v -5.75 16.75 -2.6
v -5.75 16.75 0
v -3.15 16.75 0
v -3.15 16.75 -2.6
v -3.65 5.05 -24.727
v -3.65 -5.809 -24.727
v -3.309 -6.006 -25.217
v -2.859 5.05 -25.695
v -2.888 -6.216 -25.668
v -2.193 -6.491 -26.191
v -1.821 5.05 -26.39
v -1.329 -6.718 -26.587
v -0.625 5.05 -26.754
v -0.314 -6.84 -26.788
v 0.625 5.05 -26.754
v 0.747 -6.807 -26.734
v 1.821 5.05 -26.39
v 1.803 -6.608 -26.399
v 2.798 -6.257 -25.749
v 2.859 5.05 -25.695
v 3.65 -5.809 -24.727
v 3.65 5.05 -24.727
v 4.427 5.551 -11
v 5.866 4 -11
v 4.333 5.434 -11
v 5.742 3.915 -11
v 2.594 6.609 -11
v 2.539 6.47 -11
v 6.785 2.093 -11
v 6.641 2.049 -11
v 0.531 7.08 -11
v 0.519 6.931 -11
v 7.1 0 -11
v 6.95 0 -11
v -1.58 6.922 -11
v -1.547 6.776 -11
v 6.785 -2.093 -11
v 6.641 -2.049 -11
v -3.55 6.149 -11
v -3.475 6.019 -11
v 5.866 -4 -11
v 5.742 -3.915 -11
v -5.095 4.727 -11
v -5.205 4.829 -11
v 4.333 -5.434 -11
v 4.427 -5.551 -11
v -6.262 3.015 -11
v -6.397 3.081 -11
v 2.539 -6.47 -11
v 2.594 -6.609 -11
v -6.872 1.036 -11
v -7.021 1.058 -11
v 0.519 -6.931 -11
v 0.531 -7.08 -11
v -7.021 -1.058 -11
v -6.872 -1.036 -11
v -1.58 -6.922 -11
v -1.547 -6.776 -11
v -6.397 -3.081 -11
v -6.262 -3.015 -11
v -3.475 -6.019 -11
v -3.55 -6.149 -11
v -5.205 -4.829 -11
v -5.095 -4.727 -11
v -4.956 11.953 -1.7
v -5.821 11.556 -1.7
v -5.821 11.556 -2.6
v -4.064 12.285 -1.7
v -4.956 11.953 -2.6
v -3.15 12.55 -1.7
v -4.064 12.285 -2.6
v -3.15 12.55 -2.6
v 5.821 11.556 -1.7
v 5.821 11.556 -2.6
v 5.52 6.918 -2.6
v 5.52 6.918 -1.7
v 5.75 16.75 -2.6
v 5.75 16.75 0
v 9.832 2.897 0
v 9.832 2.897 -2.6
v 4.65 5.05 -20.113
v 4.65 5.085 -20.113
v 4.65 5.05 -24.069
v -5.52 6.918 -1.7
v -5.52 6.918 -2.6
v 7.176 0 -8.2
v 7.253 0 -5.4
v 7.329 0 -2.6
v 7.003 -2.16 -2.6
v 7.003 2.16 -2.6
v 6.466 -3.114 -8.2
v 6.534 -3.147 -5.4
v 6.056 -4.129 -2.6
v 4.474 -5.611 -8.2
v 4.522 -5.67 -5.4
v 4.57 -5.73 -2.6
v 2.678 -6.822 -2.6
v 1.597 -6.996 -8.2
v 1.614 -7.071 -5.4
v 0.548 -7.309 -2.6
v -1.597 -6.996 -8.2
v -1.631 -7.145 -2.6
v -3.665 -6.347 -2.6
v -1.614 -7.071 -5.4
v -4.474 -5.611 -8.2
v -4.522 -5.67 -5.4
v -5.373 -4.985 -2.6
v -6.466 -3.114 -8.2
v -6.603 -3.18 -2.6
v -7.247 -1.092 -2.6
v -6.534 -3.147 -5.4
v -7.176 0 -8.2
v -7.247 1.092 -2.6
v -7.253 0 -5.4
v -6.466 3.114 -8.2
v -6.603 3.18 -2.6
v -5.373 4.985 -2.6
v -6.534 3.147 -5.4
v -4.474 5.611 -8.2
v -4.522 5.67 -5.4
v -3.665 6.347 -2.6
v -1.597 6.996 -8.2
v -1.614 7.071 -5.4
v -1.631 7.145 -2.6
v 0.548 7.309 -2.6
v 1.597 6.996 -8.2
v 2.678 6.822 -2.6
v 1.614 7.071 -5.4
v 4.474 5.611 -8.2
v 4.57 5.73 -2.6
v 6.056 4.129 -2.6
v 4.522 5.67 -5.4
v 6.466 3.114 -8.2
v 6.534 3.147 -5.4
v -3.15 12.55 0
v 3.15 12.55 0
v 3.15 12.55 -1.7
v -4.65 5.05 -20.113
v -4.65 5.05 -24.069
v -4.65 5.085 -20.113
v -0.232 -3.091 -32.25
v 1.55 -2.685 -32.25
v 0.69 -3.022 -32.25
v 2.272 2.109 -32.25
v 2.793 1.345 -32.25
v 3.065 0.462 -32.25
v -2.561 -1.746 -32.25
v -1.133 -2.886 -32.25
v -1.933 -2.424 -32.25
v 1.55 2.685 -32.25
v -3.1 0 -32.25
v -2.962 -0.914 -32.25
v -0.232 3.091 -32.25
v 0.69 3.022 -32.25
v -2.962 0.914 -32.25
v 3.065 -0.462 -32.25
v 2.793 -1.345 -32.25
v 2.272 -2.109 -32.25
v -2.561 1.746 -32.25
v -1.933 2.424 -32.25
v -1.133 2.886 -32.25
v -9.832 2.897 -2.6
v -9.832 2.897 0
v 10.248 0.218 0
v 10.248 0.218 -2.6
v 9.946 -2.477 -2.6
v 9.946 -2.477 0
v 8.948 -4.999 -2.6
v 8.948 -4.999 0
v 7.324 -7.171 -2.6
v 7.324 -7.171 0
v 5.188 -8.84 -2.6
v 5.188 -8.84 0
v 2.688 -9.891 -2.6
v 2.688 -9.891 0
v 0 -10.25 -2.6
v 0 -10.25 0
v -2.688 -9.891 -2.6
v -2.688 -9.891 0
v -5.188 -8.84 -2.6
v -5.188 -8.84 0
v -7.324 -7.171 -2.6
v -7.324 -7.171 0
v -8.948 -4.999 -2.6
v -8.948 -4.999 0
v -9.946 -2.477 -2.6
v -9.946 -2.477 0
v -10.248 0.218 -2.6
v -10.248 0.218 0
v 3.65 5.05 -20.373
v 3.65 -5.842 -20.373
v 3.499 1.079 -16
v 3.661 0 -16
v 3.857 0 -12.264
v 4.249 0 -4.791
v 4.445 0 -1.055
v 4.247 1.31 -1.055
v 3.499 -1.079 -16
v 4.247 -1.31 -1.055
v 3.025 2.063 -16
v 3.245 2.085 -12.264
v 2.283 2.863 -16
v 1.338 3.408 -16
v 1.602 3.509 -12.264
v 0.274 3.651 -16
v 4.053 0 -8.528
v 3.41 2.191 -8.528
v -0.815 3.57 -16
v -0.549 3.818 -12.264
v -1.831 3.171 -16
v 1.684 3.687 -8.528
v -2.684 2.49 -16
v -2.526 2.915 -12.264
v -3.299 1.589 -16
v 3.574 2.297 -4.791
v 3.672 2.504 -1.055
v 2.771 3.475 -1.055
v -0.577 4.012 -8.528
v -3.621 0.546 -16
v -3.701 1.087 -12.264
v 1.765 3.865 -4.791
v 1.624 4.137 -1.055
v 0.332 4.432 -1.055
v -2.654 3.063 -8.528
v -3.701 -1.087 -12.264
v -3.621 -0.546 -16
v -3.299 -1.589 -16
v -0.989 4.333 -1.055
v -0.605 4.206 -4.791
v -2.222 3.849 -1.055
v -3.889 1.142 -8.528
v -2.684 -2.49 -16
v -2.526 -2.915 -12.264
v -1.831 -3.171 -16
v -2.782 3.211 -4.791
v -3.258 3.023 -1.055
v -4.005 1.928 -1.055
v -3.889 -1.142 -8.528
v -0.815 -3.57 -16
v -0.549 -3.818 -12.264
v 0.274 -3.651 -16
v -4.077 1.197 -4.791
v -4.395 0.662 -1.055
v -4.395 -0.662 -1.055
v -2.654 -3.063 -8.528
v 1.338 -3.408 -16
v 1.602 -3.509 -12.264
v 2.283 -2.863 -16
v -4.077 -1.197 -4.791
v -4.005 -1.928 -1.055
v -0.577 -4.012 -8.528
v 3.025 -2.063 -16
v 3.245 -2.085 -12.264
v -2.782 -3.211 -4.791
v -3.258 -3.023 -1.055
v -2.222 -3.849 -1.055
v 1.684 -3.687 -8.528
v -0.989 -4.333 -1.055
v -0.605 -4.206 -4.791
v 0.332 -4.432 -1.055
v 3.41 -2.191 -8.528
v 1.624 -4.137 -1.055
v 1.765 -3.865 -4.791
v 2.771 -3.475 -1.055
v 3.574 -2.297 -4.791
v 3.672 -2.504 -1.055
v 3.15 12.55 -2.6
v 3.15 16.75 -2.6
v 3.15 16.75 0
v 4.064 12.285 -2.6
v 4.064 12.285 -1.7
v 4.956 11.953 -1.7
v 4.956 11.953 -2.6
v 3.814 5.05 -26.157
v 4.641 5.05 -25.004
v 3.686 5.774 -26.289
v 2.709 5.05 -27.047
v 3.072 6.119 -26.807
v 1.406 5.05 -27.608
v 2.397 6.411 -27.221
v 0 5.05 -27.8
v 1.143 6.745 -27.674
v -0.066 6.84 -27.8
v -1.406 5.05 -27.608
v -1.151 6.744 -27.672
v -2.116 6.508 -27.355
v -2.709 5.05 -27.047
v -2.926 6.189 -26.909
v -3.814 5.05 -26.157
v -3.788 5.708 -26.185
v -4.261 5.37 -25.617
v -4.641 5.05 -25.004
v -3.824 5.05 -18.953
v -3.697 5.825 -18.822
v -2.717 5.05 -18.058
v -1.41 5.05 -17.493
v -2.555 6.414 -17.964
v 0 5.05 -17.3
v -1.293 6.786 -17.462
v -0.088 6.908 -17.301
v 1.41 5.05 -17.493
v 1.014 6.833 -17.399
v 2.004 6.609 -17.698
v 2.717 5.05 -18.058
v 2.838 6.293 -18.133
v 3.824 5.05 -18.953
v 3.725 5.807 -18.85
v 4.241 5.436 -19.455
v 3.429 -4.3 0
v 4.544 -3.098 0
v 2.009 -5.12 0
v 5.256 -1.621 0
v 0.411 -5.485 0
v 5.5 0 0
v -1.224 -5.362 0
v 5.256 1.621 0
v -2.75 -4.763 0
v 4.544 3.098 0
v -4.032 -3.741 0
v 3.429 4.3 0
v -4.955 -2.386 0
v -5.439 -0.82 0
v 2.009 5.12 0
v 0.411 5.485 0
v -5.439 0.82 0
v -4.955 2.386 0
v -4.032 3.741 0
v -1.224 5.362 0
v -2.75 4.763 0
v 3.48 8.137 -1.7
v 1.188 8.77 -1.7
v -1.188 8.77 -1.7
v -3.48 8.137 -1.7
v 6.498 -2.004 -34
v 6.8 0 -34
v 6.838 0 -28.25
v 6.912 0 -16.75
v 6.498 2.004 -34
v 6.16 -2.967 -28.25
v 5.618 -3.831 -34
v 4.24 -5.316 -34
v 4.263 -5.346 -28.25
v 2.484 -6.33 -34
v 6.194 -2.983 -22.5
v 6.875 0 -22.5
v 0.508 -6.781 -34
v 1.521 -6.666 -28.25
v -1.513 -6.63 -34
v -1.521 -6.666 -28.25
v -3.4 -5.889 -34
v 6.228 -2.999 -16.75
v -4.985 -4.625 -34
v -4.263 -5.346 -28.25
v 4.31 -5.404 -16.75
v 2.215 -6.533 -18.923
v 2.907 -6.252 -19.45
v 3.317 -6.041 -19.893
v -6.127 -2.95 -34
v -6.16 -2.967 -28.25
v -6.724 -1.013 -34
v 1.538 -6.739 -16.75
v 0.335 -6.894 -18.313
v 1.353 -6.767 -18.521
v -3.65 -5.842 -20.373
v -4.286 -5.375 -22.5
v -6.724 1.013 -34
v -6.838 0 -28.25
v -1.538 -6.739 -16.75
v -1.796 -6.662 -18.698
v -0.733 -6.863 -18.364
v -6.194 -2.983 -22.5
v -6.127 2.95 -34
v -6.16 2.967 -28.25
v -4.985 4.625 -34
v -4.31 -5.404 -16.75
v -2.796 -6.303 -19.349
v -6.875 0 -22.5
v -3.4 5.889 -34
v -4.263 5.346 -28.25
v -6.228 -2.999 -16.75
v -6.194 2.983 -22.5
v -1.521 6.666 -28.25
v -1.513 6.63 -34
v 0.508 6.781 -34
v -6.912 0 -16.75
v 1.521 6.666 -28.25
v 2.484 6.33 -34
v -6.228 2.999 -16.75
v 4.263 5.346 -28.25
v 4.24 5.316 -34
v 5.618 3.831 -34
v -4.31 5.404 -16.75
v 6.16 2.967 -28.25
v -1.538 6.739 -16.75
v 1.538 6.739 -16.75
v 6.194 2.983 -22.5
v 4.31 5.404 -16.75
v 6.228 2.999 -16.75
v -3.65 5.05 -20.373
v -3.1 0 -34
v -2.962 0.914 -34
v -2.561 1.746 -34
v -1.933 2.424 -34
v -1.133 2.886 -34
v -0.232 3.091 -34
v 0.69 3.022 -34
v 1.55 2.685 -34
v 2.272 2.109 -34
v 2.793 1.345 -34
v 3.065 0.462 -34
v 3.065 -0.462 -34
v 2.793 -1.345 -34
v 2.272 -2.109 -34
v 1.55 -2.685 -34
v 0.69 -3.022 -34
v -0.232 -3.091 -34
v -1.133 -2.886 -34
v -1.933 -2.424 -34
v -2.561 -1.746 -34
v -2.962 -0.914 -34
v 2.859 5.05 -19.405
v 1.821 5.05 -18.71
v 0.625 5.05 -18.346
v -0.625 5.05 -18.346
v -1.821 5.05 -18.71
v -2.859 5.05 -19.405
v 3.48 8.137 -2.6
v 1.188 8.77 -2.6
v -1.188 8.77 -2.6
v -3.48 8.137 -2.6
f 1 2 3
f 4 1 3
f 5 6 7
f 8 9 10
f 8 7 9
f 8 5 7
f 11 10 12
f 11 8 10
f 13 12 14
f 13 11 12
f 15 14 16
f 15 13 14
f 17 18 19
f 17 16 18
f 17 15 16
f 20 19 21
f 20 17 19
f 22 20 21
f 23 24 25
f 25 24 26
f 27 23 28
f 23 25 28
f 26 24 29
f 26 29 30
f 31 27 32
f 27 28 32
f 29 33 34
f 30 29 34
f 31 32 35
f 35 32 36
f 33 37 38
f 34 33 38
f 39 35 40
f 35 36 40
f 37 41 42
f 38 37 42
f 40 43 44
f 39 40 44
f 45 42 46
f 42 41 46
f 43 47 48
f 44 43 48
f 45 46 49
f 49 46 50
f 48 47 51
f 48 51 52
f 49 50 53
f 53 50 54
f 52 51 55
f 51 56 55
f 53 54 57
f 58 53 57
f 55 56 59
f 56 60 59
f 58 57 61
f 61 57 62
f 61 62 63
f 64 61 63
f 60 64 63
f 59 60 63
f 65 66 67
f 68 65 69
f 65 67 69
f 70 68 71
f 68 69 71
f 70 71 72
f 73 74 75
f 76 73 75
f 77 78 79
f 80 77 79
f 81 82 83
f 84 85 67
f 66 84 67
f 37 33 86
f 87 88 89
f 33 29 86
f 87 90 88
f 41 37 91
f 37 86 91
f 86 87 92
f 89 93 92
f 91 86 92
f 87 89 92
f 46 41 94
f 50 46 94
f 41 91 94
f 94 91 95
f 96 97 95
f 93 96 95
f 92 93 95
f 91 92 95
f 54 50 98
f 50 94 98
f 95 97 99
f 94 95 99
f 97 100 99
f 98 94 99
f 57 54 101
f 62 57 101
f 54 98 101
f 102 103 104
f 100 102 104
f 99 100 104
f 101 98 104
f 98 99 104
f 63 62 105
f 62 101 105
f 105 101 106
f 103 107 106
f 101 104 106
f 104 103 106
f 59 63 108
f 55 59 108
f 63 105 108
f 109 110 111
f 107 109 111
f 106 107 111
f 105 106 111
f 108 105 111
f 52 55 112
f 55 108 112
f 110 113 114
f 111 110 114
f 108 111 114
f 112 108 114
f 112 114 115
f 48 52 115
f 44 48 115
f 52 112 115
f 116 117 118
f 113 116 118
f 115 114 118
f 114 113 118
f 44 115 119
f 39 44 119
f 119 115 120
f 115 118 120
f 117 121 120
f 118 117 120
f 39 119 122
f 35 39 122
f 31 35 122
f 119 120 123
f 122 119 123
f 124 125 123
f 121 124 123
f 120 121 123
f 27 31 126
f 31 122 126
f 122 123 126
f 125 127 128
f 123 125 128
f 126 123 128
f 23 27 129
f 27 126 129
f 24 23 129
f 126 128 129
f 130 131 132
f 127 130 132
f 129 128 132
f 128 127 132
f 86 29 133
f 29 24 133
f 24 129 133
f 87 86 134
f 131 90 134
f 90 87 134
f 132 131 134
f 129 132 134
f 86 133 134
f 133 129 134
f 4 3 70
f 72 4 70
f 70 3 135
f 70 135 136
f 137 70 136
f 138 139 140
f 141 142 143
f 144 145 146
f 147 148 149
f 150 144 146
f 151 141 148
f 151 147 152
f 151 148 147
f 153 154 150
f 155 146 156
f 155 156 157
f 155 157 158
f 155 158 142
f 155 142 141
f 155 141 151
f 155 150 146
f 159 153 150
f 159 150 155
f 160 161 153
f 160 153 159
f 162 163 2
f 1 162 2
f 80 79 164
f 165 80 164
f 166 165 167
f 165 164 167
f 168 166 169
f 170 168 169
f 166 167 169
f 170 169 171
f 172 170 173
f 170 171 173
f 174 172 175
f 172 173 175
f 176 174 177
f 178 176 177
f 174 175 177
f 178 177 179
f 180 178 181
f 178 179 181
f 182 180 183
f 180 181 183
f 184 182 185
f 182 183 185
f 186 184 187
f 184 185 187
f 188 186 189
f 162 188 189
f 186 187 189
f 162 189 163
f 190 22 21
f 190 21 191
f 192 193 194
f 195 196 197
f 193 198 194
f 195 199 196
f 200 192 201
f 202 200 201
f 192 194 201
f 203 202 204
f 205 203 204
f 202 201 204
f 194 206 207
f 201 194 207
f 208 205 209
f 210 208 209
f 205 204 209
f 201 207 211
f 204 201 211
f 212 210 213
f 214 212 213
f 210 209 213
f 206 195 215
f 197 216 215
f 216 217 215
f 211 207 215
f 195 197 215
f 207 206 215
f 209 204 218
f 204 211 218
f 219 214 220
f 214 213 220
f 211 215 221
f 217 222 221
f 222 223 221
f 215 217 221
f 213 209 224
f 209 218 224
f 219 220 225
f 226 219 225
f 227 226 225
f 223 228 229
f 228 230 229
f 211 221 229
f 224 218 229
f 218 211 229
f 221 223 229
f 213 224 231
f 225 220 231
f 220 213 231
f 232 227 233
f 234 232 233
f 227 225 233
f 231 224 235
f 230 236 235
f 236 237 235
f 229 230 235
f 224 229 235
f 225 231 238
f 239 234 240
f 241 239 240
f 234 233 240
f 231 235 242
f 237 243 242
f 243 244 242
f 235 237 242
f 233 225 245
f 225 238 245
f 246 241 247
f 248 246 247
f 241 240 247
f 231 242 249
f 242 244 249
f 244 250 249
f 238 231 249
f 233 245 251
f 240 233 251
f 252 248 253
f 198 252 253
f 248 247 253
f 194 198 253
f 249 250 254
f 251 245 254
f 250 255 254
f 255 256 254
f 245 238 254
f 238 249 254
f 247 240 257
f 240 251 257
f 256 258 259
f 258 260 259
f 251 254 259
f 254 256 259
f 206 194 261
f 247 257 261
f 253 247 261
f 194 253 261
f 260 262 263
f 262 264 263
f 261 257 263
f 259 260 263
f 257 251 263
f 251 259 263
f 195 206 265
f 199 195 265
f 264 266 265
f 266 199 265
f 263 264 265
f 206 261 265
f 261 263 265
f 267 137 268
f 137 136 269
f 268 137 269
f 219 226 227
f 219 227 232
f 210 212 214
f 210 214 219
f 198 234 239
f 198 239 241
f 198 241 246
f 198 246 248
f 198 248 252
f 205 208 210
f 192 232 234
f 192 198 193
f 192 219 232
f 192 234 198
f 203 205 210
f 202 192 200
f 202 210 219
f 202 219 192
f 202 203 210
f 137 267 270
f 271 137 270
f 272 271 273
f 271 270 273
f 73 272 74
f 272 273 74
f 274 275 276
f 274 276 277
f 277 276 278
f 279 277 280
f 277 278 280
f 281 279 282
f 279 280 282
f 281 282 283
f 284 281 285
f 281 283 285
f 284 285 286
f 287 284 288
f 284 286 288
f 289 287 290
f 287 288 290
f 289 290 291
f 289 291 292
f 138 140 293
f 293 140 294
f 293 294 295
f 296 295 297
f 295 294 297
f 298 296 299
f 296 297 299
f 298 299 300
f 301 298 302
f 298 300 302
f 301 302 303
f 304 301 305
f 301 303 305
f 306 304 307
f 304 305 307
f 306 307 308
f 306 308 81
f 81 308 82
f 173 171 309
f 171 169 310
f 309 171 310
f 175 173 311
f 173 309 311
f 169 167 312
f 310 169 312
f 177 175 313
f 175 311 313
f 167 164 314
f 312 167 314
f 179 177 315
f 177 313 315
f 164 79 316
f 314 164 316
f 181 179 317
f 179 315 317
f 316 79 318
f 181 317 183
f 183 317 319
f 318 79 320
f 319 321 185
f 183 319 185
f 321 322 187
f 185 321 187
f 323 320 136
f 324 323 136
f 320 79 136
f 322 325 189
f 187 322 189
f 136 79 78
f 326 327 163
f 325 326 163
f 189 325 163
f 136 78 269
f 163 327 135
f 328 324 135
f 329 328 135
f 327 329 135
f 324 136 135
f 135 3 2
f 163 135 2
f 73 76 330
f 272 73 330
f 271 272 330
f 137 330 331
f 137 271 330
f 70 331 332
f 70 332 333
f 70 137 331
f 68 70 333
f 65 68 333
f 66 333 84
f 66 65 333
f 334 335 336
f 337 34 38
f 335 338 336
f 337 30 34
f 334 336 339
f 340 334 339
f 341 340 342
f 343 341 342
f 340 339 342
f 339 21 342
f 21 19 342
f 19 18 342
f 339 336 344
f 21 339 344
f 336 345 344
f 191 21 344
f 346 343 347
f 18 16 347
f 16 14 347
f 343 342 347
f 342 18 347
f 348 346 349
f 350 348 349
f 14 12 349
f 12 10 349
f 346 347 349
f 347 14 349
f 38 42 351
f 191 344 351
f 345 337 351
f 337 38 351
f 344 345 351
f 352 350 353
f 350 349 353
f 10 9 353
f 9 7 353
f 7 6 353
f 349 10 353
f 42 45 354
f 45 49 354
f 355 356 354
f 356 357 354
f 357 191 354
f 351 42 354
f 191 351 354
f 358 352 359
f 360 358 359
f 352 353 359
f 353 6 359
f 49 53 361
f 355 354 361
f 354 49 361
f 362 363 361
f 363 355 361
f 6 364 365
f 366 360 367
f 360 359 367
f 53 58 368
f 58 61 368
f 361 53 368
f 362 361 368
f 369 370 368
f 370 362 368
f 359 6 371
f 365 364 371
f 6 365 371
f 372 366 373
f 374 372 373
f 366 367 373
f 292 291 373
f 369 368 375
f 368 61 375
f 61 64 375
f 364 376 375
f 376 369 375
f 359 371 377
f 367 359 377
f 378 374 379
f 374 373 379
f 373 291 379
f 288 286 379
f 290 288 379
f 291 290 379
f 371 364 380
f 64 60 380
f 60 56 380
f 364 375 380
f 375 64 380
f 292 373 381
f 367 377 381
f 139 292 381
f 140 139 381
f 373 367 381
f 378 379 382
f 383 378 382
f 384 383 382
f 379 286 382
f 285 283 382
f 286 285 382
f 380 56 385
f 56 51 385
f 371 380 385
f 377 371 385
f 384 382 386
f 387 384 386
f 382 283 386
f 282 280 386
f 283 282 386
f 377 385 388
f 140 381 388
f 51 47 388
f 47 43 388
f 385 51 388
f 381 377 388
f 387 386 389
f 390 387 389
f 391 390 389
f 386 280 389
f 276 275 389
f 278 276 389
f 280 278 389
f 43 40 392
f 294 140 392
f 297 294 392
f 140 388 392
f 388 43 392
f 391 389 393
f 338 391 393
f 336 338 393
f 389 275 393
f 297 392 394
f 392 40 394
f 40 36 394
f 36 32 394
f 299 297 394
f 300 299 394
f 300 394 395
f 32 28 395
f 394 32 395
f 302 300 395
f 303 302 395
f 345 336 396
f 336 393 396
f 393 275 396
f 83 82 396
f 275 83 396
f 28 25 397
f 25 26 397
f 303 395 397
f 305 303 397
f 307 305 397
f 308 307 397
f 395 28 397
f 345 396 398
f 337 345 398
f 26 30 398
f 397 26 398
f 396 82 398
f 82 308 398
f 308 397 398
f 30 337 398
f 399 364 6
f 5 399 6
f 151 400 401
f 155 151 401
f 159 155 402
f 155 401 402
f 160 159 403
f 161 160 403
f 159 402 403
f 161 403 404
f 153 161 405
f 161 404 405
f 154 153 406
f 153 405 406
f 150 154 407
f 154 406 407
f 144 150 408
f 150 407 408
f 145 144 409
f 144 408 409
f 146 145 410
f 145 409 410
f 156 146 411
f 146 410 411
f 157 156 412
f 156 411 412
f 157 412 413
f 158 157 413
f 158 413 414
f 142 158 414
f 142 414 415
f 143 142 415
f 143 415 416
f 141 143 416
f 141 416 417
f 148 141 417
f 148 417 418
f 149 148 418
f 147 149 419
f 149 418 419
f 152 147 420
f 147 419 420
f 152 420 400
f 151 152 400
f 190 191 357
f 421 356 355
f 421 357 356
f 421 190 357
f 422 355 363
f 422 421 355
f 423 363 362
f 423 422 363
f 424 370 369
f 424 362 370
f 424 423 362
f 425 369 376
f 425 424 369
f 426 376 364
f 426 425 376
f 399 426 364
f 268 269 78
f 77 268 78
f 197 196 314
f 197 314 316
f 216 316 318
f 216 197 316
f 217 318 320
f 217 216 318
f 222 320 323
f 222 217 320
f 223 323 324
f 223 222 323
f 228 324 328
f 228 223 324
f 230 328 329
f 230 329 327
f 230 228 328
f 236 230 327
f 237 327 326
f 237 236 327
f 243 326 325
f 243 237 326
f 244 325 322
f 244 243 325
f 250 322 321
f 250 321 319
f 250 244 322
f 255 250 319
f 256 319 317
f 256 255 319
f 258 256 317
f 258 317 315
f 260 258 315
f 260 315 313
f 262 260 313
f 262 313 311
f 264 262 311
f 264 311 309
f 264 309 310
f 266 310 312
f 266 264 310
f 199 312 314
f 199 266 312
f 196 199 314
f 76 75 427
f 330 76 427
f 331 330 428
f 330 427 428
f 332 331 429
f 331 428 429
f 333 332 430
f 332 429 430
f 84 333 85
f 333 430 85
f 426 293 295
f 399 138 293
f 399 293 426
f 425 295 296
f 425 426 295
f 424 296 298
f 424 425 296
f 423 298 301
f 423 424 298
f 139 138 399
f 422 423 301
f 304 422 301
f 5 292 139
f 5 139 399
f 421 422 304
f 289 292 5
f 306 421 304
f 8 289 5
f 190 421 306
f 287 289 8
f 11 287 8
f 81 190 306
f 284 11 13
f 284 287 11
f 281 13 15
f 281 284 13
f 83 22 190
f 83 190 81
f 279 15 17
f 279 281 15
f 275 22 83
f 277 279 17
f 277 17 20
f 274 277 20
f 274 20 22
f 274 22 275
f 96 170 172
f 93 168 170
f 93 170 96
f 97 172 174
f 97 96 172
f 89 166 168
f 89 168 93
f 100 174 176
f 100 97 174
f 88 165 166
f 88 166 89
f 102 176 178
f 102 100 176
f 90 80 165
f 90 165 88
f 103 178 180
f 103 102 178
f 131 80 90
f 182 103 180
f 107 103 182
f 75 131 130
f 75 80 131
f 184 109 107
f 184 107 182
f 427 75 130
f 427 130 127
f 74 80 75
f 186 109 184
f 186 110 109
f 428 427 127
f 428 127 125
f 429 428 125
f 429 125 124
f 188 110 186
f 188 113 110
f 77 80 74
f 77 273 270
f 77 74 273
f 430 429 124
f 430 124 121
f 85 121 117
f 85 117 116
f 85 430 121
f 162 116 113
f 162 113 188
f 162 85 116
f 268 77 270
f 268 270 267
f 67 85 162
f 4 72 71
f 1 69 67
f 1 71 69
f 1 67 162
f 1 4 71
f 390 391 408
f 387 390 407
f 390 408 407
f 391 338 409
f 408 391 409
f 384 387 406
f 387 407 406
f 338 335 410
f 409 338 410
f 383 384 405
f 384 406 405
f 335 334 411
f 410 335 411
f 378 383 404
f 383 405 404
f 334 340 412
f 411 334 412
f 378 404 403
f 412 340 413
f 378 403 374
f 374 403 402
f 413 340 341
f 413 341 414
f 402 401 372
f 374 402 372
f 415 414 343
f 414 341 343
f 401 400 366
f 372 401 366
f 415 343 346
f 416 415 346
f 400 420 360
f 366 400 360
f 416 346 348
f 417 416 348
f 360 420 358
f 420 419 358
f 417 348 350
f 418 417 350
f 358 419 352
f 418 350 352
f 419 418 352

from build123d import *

# Parameters (mm, degrees)
BOSS_EXTRUDE1_DEPTH = 2.6
CUT_EXTRUDE1_DEPTH  = 0.9
SKETCH4_R           = 4.5
CUT_EXTRUDE2_DEPTH  = 16
CUT_EXTRUDE2_DRAFT  = -3
SKETCH5_R           = 3.1
CUT_EXTRUDE3_DEPTH  = 1.75
CUT_EXTRUDE4_DEPTH  = 43.200740515
CUT_EXTRUDE5_DEPTH  = 7.5
CHAMFER1_SIZE       = 1
CHAMFER1_SIZE2      = 1.056754503


with BuildPart() as part:
    # Sketch1 → Revolve1 (revolve)
    with BuildSketch(Plane(origin=(0, 0, 0), x_dir=(0, 0, -1), z_dir=(1, 0, 0)), mode=Mode.PRIVATE) as revolve1_sk:
        Polygon((34, 0), (34, 6.8), (11, 6.95), (11, 7.1), (0, 7.4), (0, 0), align=None)
    revolve(revolve1_sk.sketch.rotate(Axis((0, 0, 0), (0, 0, -1)), 90), axis=Axis((0, 0, 0), (0, 0, -1)))

    # Sketch2 → Boss-Extrude1 (add)
    with BuildSketch(Plane.XY):
        with BuildLine():
            Line((-9.832020922, 2.897216699), (-5.75, 16.75))
            Line((-5.75, 16.75), (-3.15, 16.75))
            Line((-3.15, 16.75), (-3.15, 12.55))
            Line((-3.15, 12.55), (3.15, 12.55))
            Line((3.15, 12.55), (3.15, 16.75))
            Line((3.15, 16.75), (5.75, 16.75))
            Line((5.75, 16.75), (9.832020922, 2.897216699))
            ThreePointArc((9.832020922, 2.897216699), (0, -10.25), (-9.832020922, 2.897216699))
        make_face()
    extrude(amount=-BOSS_EXTRUDE1_DEPTH)

    # Sketch3 → Cut-Extrude1 (cut)
    with BuildSketch(Plane(origin=(0, 0, -2.6), x_dir=(-1, 0, 0), z_dir=(0, 0, -1))):
        with BuildLine():
            Line((-5.821011016, 11.555986793), (-5.519758848, 6.917713659))
            ThreePointArc((-5.519758848, 6.917713659), (0, 8.85), (5.519758848, 6.917713659))
            Line((5.519758848, 6.917713659), (5.821011016, 11.555986793))
            ThreePointArc((5.821011016, 11.555986793), (0, 12.939281278), (-5.821011016, 11.555986793))
        make_face()
    extrude(amount=-CUT_EXTRUDE1_DEPTH, mode=Mode.SUBTRACT)


with BuildPart() as cut_extrude2_tool:
    # Sketch4 → Cut-Extrude2 (with draft: the straight prism first)
    with BuildSketch(Plane.XY):
        Circle(SKETCH4_R)
    extrude(amount=-CUT_EXTRUDE2_DEPTH)
    # Cut-Extrude2: the draft: its side faces are tilted about the plane it starts from
    cut_extrude2_sides = [cut_extrude2_tool.faces().sort_by_distance(p)[0] for p in [
        (-4.5, 0, -8),
    ]]
    draft(cut_extrude2_sides, Plane.XY, CUT_EXTRUDE2_DRAFT)


with BuildPart() as part_1:
    add(part.part)

    # Cut-Extrude2: cut by cut_extrude2_tool
    add(cut_extrude2_tool.part, mode=Mode.SUBTRACT)

    # Sketch5 → Cut-Extrude3 (cut)
    with BuildSketch(Plane(origin=(0, 0, -34), x_dir=(-1, 0, 0), z_dir=(0, 0, -1))):
        Circle(SKETCH5_R)
    extrude(amount=-CUT_EXTRUDE3_DEPTH, mode=Mode.SUBTRACT)

    # Sketch6 → Cut-Extrude4 (cut, through all)
    with BuildSketch(Plane(origin=(0, 12.55, 0), x_dir=(1, 0, 0), z_dir=(0, 1, 0))):
        with BuildLine():
            Line((-3.65, 20.372845894), (-3.65, 24.727154106))
            ThreePointArc((-3.65, 24.727154106), (0, 26.8), (3.65, 24.727154106))
            Line((3.65, 24.727154106), (3.65, 20.372845894))
            ThreePointArc((3.65, 20.372845894), (0, 18.3), (-3.65, 20.372845894))
        make_face()
    extrude(amount=-CUT_EXTRUDE4_DEPTH, mode=Mode.SUBTRACT)

    # Sketch7 → Cut-Extrude5 (cut)
    with BuildSketch(Plane(origin=(0, 12.55, 0), x_dir=(1, 0, 0), z_dir=(0, 1, 0))):
        with BuildLine():
            Line((4.65, 20.112788479), (4.65, 24.987211521))
            ThreePointArc((4.65, 24.987211521), (0, 27.8), (-4.65, 24.987211521))
            Line((-4.65, 24.987211521), (-4.65, 20.112788479))
            ThreePointArc((-4.65, 20.112788479), (0, 17.3), (4.65, 20.112788479))
        make_face()
    extrude(amount=-CUT_EXTRUDE5_DEPTH, mode=Mode.SUBTRACT)

    # Chamfer1
    chamfer1_edges = [part_1.edges().sort_by_distance(p)[0] for p in [
        (-4.5, 0, 0),
    ]]
    chamfer1_side = [part_1.faces().sort_by_distance(p)[0] for p in [
        (-7.465828695, 9.727786539, 0),
    ]]
    chamfer(chamfer1_edges, length=CHAMFER1_SIZE, length2=CHAMFER1_SIZE2, reference=chamfer1_side[0])


solid = part_1.part
